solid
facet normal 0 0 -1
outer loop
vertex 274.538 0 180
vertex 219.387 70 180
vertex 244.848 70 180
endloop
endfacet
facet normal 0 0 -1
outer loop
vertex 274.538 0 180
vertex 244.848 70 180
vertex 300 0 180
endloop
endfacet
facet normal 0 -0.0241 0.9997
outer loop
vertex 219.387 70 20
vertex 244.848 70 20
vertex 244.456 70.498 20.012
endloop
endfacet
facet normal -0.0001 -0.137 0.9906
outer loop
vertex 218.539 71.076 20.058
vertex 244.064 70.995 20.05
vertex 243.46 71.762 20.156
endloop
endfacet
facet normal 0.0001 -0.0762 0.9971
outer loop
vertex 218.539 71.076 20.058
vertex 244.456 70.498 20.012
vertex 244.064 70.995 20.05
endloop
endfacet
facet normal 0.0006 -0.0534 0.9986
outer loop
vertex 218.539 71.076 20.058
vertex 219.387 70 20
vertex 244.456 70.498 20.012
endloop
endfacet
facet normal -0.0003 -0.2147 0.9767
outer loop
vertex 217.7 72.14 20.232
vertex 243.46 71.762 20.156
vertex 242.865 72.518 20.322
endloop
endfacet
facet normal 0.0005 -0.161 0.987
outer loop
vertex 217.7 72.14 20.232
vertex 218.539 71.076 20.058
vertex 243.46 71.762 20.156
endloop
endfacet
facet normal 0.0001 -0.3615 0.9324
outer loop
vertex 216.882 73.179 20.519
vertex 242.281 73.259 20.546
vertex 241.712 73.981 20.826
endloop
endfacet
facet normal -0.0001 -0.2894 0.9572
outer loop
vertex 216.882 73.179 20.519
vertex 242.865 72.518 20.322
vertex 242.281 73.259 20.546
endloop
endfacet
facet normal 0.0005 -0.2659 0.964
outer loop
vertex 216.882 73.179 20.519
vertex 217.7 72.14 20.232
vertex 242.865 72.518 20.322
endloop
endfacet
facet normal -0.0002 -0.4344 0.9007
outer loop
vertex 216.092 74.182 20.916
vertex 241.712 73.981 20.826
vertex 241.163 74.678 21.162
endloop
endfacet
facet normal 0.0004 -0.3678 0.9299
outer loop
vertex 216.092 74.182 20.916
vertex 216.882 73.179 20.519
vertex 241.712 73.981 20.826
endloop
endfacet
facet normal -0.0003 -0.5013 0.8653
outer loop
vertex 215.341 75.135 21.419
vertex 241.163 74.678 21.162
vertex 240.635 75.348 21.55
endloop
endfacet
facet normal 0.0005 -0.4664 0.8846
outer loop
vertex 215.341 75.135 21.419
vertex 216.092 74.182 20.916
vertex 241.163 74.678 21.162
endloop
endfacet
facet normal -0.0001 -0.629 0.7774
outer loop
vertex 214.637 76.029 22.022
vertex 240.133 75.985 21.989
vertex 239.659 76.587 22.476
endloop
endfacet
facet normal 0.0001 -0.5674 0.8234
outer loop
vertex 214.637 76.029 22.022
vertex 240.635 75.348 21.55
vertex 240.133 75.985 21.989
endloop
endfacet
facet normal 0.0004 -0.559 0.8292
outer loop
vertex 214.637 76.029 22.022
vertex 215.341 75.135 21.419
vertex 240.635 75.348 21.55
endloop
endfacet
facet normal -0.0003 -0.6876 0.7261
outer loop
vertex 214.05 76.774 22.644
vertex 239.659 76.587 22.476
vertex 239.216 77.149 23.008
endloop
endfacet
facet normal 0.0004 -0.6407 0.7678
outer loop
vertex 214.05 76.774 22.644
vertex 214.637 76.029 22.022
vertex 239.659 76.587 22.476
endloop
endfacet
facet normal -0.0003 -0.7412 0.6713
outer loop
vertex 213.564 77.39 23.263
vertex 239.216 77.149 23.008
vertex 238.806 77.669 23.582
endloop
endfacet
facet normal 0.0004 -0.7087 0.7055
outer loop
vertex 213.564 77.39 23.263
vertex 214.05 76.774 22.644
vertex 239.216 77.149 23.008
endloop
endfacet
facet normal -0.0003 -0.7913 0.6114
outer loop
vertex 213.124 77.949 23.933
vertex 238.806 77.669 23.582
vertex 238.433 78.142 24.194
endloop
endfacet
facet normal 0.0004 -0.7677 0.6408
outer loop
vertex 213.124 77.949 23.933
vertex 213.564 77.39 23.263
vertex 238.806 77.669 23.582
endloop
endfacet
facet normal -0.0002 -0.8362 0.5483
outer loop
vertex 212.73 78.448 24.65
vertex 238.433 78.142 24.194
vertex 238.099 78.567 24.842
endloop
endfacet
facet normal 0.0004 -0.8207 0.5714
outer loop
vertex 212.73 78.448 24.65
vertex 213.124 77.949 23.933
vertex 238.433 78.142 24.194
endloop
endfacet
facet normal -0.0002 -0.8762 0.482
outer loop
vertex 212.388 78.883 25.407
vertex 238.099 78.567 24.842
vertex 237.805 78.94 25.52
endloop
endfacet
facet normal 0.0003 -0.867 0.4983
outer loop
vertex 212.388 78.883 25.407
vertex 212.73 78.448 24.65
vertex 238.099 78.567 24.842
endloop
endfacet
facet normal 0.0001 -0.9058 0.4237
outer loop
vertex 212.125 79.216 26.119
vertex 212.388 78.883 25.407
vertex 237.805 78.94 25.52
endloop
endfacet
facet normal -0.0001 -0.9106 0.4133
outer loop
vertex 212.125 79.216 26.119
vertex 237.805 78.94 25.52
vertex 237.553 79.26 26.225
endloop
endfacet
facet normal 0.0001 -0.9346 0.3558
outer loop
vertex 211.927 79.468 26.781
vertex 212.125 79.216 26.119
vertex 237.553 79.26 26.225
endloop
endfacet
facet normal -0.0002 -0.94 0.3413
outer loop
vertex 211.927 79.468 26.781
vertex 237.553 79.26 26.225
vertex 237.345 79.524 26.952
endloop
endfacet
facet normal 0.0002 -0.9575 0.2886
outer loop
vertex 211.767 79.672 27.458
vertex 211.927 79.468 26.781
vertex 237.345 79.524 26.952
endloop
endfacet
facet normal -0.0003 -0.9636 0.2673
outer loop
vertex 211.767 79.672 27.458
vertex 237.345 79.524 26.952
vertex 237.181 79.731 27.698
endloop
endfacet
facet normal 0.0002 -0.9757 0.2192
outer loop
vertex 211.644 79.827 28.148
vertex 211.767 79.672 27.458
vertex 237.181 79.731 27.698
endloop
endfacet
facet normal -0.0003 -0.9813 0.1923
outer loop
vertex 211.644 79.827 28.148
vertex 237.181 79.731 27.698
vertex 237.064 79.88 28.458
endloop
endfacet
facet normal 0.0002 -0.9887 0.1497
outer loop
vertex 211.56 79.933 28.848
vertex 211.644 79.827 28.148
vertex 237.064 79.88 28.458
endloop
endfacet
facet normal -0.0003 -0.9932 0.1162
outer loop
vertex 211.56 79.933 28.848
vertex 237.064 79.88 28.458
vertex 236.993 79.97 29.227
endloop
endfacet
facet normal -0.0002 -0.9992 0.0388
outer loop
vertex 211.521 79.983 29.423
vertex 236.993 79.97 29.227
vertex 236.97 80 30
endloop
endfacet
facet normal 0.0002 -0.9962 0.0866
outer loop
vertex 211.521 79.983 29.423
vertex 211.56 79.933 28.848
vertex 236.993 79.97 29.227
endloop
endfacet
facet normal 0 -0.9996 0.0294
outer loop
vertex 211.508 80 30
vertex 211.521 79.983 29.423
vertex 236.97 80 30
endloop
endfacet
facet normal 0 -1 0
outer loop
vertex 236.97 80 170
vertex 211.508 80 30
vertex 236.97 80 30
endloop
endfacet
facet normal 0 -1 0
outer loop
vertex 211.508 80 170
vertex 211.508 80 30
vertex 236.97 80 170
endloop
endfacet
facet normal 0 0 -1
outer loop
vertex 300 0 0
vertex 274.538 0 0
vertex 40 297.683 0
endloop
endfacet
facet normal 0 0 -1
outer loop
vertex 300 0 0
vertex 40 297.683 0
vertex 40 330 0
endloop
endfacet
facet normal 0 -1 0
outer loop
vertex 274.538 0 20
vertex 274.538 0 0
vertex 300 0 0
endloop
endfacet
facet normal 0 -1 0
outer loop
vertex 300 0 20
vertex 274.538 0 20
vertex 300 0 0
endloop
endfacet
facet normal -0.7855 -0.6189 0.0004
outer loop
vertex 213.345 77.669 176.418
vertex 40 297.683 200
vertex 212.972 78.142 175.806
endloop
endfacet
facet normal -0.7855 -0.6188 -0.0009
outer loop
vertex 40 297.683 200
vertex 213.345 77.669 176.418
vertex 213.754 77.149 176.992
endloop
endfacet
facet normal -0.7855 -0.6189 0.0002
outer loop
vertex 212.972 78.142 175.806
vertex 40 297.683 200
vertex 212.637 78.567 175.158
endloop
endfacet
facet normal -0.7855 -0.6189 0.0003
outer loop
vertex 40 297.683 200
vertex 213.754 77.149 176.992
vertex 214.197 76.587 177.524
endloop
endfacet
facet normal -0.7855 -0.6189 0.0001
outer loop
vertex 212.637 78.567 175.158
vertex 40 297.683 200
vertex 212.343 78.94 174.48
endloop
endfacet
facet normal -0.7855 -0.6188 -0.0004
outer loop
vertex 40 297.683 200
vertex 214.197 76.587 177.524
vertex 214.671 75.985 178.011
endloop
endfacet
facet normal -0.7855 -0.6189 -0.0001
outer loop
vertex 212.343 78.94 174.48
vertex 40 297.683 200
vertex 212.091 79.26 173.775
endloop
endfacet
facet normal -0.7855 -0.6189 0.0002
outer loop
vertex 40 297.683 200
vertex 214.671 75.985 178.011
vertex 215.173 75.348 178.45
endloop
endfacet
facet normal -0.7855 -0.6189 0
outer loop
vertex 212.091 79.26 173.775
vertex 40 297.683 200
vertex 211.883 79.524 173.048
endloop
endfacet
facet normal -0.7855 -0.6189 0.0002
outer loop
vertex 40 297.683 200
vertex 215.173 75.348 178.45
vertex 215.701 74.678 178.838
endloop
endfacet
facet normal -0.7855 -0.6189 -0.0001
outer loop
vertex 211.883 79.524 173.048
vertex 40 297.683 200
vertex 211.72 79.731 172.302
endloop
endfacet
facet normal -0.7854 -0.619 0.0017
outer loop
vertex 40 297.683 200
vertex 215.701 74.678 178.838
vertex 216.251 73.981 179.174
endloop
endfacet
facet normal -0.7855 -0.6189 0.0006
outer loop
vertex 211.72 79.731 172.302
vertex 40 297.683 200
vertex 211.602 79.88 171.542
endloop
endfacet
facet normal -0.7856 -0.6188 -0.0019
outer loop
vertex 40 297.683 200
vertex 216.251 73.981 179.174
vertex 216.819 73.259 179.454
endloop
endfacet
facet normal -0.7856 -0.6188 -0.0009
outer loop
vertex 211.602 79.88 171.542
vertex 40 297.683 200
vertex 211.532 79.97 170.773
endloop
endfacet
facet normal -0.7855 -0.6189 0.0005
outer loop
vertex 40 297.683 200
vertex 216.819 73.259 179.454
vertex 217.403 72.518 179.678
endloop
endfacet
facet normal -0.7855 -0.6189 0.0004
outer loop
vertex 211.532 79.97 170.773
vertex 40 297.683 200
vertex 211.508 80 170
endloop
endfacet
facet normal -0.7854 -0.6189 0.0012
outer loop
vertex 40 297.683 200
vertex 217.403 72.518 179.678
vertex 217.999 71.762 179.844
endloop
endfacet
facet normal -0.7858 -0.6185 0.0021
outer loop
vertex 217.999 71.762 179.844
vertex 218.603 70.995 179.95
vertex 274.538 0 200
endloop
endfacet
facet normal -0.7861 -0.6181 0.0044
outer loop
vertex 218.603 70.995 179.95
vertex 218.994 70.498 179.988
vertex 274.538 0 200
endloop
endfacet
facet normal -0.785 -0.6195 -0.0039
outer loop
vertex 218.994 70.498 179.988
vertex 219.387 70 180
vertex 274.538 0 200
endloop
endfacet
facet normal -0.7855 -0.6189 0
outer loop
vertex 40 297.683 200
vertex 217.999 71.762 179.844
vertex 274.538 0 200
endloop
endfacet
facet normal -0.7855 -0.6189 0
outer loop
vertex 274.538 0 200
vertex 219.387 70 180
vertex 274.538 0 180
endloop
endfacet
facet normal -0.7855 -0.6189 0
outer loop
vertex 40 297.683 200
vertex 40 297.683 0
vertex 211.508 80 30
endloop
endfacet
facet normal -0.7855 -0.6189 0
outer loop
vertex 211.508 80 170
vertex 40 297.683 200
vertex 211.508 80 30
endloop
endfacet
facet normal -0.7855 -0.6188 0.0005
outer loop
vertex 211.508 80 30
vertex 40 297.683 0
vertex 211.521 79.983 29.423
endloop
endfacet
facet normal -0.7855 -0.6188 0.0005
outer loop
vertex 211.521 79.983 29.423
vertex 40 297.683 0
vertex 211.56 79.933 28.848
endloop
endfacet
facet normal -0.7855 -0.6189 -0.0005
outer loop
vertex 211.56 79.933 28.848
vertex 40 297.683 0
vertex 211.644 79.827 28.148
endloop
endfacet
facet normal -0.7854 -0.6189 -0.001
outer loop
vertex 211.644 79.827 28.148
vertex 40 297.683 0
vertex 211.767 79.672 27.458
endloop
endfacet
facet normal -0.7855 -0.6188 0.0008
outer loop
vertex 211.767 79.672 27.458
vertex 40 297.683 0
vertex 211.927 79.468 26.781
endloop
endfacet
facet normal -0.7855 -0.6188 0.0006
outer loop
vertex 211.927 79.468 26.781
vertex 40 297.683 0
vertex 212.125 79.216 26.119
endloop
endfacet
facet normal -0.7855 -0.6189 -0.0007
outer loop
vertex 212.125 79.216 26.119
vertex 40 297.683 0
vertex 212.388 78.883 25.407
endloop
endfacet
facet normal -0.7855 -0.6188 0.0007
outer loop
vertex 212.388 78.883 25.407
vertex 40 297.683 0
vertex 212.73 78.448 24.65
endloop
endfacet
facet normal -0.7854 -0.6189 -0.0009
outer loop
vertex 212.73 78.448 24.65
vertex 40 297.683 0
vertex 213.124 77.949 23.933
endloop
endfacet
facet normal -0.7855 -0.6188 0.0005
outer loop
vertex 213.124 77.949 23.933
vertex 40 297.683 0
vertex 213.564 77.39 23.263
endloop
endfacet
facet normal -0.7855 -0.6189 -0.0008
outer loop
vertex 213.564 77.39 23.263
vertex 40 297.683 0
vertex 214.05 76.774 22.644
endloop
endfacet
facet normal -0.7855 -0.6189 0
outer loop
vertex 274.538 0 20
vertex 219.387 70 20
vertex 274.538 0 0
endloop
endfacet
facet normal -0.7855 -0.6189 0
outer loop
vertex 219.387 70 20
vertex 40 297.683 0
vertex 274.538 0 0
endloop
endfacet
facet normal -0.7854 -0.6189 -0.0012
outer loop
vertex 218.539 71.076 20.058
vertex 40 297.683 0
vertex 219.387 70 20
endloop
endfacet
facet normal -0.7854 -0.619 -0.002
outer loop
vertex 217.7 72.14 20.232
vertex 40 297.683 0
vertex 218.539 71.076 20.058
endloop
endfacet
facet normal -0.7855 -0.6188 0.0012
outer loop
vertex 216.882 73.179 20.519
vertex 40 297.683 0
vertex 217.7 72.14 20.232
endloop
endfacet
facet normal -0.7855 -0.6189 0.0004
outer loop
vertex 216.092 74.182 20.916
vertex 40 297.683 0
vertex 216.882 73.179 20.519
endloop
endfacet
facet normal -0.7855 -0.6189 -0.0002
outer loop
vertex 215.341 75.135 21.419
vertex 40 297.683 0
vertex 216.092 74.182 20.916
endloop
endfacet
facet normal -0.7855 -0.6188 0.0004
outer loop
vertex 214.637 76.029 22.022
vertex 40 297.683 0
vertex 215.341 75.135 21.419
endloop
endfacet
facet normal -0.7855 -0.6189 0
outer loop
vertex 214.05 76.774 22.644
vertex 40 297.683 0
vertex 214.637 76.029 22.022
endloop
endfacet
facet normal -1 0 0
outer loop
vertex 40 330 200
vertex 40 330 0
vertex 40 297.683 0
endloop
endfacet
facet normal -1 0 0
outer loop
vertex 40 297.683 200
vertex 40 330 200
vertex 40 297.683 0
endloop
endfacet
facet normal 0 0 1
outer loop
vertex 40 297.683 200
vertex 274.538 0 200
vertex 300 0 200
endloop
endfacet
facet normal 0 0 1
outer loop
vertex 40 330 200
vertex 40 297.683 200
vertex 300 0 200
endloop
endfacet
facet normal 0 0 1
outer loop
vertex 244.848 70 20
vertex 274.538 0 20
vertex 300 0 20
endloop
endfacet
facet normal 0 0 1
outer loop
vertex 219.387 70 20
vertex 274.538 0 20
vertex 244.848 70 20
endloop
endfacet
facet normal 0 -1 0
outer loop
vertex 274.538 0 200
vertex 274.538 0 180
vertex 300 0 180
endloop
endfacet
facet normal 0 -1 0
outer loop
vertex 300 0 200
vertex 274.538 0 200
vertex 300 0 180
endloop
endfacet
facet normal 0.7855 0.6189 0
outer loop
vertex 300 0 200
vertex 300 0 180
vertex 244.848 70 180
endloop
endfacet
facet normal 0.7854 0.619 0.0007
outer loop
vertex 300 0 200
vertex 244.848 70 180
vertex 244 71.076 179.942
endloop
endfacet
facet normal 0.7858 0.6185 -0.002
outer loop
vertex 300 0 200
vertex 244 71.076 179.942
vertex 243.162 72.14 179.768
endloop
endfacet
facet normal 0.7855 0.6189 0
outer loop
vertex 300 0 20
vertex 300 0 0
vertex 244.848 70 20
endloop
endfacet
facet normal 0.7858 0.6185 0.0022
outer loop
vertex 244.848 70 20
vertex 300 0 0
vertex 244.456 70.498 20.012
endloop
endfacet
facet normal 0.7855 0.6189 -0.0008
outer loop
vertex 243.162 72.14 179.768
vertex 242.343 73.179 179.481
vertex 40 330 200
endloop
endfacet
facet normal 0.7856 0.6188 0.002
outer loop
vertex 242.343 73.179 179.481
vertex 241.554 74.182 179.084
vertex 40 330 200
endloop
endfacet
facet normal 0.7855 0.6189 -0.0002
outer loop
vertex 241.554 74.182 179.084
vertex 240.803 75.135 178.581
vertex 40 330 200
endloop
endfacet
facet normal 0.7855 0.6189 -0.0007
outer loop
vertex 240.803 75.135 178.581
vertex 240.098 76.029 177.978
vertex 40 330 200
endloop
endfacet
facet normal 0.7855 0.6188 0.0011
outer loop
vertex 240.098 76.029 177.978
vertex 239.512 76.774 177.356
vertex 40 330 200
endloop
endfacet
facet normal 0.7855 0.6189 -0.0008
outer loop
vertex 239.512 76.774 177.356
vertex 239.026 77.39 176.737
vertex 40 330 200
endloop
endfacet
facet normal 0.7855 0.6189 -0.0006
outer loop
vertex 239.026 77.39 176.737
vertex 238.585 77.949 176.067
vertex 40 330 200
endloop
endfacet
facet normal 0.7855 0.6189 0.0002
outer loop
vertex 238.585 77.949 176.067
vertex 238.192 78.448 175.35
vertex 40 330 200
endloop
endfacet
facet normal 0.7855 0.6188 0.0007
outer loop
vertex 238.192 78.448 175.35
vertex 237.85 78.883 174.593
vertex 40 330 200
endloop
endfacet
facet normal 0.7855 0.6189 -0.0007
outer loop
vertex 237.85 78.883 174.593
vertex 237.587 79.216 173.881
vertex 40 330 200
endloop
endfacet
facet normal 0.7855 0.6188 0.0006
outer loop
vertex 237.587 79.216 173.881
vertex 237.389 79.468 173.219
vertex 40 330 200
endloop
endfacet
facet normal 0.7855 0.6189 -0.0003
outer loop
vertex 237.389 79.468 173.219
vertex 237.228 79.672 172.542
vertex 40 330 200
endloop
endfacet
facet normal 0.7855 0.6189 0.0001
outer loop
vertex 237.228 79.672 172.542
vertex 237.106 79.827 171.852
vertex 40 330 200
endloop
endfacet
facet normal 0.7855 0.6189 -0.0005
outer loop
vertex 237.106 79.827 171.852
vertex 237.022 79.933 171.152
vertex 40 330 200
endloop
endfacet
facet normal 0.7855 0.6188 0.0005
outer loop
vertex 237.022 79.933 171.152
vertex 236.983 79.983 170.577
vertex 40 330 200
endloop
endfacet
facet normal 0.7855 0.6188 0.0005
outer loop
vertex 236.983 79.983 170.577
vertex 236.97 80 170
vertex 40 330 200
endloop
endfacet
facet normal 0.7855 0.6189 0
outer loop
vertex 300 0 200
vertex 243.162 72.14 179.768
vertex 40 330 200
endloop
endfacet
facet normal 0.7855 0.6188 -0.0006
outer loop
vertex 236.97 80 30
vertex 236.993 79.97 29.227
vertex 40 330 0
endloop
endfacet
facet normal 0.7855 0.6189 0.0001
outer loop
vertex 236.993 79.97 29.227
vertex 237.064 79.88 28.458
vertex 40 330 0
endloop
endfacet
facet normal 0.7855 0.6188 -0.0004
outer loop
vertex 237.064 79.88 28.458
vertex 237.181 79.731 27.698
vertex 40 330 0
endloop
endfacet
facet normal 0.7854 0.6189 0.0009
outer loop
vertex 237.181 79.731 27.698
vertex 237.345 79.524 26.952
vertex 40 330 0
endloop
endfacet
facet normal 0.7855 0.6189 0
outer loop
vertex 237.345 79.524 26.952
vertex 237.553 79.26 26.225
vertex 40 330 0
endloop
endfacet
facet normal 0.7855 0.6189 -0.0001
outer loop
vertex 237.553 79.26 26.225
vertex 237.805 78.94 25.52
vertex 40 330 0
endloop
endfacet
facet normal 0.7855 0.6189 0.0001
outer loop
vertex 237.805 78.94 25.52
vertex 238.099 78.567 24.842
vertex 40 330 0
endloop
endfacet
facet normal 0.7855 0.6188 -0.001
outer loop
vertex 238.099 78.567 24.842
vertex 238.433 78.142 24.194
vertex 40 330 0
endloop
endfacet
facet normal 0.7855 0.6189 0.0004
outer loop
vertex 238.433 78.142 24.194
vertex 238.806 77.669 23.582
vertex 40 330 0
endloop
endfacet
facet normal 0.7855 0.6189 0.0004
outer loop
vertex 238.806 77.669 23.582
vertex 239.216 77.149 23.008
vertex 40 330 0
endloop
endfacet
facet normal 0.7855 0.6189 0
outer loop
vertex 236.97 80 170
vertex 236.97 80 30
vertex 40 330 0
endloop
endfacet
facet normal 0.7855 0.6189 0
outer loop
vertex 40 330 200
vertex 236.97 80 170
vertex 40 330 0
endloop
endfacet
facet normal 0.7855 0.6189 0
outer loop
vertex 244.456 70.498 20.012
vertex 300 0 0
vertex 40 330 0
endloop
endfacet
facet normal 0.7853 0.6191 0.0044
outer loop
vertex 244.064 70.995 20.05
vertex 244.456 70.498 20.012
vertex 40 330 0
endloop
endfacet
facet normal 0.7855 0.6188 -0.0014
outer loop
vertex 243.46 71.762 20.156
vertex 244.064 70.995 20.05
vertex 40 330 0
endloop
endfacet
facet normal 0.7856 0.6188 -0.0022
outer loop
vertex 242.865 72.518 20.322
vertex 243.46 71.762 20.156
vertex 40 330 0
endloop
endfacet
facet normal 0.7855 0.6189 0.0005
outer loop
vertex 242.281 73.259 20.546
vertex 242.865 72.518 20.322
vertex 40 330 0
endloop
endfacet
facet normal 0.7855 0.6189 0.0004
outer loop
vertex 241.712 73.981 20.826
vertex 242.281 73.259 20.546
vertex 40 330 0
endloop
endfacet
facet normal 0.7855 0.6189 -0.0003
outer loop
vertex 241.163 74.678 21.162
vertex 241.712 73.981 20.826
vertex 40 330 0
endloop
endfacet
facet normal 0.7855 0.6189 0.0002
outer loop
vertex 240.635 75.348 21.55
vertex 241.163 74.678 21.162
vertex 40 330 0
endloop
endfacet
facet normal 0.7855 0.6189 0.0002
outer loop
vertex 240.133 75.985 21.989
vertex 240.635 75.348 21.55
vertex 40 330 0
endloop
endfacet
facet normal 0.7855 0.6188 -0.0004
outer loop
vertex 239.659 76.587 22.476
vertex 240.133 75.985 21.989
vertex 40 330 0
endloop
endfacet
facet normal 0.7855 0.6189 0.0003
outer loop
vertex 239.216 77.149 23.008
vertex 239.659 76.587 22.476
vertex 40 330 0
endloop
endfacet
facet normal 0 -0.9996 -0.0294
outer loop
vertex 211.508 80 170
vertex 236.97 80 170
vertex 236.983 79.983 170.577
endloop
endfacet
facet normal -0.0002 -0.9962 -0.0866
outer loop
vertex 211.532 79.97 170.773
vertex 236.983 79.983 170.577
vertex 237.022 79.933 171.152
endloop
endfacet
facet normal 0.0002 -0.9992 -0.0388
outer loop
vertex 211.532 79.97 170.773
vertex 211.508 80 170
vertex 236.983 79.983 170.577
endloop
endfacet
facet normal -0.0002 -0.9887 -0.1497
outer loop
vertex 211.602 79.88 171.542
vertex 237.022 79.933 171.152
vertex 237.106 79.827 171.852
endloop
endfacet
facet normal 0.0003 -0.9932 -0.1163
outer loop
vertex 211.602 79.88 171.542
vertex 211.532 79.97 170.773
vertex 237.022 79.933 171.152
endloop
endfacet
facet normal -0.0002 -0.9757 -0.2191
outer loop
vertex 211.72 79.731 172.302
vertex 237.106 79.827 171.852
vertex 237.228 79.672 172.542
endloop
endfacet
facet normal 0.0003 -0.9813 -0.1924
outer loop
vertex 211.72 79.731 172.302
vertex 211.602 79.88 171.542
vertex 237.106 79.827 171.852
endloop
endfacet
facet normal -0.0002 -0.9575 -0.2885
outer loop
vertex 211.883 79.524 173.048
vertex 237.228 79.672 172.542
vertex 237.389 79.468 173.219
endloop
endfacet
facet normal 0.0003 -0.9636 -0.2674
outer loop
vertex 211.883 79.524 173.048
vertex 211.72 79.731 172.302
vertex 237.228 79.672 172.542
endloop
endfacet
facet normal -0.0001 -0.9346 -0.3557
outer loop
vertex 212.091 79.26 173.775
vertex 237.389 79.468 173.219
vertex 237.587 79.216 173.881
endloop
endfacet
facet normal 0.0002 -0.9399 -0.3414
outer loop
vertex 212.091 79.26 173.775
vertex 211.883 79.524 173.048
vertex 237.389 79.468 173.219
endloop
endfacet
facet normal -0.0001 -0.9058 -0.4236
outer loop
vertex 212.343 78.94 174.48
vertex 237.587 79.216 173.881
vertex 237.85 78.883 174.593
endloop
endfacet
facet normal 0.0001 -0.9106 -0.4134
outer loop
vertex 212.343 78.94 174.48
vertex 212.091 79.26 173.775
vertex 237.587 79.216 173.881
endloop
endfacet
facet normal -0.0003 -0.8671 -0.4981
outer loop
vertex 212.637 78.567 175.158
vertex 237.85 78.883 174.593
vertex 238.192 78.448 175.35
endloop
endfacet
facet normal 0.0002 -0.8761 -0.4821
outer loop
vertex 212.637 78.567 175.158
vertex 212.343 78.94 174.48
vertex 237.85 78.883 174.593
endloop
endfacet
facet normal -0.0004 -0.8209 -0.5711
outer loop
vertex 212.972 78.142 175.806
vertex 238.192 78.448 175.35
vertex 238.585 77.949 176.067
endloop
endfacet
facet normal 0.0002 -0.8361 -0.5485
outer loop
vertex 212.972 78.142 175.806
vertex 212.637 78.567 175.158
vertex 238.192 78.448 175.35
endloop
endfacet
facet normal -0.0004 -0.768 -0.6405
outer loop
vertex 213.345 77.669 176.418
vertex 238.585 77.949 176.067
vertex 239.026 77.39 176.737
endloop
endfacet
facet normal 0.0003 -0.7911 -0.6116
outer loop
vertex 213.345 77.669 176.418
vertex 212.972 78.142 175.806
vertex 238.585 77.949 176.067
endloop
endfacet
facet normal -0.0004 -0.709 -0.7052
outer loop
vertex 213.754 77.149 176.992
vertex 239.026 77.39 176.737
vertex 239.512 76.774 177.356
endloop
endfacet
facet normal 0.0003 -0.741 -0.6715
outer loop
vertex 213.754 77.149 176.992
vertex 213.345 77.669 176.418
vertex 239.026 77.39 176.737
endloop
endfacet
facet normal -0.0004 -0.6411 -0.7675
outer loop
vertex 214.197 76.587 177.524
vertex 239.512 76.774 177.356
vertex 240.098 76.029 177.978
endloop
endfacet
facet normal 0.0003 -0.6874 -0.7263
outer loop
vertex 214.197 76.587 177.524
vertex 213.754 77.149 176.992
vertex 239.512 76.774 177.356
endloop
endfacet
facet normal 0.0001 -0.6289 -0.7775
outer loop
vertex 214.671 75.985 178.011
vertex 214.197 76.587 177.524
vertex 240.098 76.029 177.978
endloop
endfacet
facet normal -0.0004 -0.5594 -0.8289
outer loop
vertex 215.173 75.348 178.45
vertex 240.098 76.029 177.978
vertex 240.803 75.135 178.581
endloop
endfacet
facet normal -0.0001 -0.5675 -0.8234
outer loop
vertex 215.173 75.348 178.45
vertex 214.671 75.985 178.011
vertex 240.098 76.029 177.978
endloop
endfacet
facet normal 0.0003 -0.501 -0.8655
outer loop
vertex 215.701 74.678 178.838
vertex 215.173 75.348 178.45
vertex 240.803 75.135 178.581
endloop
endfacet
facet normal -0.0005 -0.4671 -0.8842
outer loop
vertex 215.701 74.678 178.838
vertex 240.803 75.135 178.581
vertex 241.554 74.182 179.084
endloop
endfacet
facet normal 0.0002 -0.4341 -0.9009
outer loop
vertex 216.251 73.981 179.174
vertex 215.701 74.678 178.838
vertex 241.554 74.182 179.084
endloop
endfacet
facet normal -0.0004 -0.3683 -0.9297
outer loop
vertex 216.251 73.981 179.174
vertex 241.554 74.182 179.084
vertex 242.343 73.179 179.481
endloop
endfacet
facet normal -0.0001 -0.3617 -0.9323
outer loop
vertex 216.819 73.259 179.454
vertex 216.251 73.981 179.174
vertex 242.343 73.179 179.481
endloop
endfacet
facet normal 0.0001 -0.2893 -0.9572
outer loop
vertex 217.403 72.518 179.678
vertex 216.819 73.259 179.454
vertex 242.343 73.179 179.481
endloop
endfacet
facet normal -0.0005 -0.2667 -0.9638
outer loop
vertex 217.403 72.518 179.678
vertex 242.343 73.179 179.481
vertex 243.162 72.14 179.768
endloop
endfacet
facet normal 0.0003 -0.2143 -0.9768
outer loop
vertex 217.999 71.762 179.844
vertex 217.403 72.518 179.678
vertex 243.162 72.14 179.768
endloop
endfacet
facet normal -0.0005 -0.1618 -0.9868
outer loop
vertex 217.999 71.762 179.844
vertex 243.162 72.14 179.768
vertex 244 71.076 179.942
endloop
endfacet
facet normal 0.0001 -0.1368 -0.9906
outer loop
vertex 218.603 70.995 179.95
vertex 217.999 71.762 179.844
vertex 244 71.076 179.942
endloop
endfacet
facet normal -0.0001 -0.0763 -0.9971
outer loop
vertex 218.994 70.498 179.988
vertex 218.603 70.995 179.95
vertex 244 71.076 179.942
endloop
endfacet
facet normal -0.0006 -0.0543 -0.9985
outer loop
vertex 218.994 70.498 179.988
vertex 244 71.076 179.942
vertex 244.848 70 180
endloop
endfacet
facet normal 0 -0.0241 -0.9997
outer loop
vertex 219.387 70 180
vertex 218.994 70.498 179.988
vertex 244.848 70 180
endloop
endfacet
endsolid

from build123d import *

# Parameters (mm, degrees)
F1_DEPTH = 200
F2_W     = 10.593976
F2_H     = 10
F3_DEPTH = 467


with BuildPart() as f1:
    # F0 (on Top) → F1 (new body)
    with BuildSketch(Plane.XY):
        Polygon((40, 297.683151), (274.538241, 0), (300, 0), (40, 330), align=None)
    extrude(amount=F1_DEPTH)

    # F2 (on Right) → F3 (cut)
    with BuildSketch(Plane.YZ):
        with BuildLine():
            ThreePointArc((0, 170), (2.928932, 177.071068), (10, 180))
            Line((10, 180), (-16.794052, 180))
            Line((-16.794052, 180), (-16.794052, 171.051905))
            Line((-16.794052, 171.051905), (0, 170))
        make_face()
        with Locations((-5.296988, 25)):
            Rectangle(F2_W, F2_H)
        with BuildLine():
            Line((80, 30), (80, 170))
            ThreePointArc((80, 170), (77.071068, 177.071068), (70, 180))
            Line((70, 180), (10, 180))
            ThreePointArc((10, 180), (2.928932, 177.071068), (0, 170))
            Line((0, 170), (0, 100))
            Line((0, 100), (0, 30))
            ThreePointArc((0, 30), (2.928932, 22.928932), (10, 20))
            Line((10, 20), (70, 20))
            ThreePointArc((70, 20), (77.071068, 22.928932), (80, 30))
        make_face()
        with BuildLine():
            Line((0, 20), (10, 20))
            ThreePointArc((10, 20), (2.928932, 22.928932), (0, 30))
            Line((0, 30), (0, 20))
        make_face()
    extrude(amount=F3_DEPTH, mode=Mode.SUBTRACT)


solid = f1.part
